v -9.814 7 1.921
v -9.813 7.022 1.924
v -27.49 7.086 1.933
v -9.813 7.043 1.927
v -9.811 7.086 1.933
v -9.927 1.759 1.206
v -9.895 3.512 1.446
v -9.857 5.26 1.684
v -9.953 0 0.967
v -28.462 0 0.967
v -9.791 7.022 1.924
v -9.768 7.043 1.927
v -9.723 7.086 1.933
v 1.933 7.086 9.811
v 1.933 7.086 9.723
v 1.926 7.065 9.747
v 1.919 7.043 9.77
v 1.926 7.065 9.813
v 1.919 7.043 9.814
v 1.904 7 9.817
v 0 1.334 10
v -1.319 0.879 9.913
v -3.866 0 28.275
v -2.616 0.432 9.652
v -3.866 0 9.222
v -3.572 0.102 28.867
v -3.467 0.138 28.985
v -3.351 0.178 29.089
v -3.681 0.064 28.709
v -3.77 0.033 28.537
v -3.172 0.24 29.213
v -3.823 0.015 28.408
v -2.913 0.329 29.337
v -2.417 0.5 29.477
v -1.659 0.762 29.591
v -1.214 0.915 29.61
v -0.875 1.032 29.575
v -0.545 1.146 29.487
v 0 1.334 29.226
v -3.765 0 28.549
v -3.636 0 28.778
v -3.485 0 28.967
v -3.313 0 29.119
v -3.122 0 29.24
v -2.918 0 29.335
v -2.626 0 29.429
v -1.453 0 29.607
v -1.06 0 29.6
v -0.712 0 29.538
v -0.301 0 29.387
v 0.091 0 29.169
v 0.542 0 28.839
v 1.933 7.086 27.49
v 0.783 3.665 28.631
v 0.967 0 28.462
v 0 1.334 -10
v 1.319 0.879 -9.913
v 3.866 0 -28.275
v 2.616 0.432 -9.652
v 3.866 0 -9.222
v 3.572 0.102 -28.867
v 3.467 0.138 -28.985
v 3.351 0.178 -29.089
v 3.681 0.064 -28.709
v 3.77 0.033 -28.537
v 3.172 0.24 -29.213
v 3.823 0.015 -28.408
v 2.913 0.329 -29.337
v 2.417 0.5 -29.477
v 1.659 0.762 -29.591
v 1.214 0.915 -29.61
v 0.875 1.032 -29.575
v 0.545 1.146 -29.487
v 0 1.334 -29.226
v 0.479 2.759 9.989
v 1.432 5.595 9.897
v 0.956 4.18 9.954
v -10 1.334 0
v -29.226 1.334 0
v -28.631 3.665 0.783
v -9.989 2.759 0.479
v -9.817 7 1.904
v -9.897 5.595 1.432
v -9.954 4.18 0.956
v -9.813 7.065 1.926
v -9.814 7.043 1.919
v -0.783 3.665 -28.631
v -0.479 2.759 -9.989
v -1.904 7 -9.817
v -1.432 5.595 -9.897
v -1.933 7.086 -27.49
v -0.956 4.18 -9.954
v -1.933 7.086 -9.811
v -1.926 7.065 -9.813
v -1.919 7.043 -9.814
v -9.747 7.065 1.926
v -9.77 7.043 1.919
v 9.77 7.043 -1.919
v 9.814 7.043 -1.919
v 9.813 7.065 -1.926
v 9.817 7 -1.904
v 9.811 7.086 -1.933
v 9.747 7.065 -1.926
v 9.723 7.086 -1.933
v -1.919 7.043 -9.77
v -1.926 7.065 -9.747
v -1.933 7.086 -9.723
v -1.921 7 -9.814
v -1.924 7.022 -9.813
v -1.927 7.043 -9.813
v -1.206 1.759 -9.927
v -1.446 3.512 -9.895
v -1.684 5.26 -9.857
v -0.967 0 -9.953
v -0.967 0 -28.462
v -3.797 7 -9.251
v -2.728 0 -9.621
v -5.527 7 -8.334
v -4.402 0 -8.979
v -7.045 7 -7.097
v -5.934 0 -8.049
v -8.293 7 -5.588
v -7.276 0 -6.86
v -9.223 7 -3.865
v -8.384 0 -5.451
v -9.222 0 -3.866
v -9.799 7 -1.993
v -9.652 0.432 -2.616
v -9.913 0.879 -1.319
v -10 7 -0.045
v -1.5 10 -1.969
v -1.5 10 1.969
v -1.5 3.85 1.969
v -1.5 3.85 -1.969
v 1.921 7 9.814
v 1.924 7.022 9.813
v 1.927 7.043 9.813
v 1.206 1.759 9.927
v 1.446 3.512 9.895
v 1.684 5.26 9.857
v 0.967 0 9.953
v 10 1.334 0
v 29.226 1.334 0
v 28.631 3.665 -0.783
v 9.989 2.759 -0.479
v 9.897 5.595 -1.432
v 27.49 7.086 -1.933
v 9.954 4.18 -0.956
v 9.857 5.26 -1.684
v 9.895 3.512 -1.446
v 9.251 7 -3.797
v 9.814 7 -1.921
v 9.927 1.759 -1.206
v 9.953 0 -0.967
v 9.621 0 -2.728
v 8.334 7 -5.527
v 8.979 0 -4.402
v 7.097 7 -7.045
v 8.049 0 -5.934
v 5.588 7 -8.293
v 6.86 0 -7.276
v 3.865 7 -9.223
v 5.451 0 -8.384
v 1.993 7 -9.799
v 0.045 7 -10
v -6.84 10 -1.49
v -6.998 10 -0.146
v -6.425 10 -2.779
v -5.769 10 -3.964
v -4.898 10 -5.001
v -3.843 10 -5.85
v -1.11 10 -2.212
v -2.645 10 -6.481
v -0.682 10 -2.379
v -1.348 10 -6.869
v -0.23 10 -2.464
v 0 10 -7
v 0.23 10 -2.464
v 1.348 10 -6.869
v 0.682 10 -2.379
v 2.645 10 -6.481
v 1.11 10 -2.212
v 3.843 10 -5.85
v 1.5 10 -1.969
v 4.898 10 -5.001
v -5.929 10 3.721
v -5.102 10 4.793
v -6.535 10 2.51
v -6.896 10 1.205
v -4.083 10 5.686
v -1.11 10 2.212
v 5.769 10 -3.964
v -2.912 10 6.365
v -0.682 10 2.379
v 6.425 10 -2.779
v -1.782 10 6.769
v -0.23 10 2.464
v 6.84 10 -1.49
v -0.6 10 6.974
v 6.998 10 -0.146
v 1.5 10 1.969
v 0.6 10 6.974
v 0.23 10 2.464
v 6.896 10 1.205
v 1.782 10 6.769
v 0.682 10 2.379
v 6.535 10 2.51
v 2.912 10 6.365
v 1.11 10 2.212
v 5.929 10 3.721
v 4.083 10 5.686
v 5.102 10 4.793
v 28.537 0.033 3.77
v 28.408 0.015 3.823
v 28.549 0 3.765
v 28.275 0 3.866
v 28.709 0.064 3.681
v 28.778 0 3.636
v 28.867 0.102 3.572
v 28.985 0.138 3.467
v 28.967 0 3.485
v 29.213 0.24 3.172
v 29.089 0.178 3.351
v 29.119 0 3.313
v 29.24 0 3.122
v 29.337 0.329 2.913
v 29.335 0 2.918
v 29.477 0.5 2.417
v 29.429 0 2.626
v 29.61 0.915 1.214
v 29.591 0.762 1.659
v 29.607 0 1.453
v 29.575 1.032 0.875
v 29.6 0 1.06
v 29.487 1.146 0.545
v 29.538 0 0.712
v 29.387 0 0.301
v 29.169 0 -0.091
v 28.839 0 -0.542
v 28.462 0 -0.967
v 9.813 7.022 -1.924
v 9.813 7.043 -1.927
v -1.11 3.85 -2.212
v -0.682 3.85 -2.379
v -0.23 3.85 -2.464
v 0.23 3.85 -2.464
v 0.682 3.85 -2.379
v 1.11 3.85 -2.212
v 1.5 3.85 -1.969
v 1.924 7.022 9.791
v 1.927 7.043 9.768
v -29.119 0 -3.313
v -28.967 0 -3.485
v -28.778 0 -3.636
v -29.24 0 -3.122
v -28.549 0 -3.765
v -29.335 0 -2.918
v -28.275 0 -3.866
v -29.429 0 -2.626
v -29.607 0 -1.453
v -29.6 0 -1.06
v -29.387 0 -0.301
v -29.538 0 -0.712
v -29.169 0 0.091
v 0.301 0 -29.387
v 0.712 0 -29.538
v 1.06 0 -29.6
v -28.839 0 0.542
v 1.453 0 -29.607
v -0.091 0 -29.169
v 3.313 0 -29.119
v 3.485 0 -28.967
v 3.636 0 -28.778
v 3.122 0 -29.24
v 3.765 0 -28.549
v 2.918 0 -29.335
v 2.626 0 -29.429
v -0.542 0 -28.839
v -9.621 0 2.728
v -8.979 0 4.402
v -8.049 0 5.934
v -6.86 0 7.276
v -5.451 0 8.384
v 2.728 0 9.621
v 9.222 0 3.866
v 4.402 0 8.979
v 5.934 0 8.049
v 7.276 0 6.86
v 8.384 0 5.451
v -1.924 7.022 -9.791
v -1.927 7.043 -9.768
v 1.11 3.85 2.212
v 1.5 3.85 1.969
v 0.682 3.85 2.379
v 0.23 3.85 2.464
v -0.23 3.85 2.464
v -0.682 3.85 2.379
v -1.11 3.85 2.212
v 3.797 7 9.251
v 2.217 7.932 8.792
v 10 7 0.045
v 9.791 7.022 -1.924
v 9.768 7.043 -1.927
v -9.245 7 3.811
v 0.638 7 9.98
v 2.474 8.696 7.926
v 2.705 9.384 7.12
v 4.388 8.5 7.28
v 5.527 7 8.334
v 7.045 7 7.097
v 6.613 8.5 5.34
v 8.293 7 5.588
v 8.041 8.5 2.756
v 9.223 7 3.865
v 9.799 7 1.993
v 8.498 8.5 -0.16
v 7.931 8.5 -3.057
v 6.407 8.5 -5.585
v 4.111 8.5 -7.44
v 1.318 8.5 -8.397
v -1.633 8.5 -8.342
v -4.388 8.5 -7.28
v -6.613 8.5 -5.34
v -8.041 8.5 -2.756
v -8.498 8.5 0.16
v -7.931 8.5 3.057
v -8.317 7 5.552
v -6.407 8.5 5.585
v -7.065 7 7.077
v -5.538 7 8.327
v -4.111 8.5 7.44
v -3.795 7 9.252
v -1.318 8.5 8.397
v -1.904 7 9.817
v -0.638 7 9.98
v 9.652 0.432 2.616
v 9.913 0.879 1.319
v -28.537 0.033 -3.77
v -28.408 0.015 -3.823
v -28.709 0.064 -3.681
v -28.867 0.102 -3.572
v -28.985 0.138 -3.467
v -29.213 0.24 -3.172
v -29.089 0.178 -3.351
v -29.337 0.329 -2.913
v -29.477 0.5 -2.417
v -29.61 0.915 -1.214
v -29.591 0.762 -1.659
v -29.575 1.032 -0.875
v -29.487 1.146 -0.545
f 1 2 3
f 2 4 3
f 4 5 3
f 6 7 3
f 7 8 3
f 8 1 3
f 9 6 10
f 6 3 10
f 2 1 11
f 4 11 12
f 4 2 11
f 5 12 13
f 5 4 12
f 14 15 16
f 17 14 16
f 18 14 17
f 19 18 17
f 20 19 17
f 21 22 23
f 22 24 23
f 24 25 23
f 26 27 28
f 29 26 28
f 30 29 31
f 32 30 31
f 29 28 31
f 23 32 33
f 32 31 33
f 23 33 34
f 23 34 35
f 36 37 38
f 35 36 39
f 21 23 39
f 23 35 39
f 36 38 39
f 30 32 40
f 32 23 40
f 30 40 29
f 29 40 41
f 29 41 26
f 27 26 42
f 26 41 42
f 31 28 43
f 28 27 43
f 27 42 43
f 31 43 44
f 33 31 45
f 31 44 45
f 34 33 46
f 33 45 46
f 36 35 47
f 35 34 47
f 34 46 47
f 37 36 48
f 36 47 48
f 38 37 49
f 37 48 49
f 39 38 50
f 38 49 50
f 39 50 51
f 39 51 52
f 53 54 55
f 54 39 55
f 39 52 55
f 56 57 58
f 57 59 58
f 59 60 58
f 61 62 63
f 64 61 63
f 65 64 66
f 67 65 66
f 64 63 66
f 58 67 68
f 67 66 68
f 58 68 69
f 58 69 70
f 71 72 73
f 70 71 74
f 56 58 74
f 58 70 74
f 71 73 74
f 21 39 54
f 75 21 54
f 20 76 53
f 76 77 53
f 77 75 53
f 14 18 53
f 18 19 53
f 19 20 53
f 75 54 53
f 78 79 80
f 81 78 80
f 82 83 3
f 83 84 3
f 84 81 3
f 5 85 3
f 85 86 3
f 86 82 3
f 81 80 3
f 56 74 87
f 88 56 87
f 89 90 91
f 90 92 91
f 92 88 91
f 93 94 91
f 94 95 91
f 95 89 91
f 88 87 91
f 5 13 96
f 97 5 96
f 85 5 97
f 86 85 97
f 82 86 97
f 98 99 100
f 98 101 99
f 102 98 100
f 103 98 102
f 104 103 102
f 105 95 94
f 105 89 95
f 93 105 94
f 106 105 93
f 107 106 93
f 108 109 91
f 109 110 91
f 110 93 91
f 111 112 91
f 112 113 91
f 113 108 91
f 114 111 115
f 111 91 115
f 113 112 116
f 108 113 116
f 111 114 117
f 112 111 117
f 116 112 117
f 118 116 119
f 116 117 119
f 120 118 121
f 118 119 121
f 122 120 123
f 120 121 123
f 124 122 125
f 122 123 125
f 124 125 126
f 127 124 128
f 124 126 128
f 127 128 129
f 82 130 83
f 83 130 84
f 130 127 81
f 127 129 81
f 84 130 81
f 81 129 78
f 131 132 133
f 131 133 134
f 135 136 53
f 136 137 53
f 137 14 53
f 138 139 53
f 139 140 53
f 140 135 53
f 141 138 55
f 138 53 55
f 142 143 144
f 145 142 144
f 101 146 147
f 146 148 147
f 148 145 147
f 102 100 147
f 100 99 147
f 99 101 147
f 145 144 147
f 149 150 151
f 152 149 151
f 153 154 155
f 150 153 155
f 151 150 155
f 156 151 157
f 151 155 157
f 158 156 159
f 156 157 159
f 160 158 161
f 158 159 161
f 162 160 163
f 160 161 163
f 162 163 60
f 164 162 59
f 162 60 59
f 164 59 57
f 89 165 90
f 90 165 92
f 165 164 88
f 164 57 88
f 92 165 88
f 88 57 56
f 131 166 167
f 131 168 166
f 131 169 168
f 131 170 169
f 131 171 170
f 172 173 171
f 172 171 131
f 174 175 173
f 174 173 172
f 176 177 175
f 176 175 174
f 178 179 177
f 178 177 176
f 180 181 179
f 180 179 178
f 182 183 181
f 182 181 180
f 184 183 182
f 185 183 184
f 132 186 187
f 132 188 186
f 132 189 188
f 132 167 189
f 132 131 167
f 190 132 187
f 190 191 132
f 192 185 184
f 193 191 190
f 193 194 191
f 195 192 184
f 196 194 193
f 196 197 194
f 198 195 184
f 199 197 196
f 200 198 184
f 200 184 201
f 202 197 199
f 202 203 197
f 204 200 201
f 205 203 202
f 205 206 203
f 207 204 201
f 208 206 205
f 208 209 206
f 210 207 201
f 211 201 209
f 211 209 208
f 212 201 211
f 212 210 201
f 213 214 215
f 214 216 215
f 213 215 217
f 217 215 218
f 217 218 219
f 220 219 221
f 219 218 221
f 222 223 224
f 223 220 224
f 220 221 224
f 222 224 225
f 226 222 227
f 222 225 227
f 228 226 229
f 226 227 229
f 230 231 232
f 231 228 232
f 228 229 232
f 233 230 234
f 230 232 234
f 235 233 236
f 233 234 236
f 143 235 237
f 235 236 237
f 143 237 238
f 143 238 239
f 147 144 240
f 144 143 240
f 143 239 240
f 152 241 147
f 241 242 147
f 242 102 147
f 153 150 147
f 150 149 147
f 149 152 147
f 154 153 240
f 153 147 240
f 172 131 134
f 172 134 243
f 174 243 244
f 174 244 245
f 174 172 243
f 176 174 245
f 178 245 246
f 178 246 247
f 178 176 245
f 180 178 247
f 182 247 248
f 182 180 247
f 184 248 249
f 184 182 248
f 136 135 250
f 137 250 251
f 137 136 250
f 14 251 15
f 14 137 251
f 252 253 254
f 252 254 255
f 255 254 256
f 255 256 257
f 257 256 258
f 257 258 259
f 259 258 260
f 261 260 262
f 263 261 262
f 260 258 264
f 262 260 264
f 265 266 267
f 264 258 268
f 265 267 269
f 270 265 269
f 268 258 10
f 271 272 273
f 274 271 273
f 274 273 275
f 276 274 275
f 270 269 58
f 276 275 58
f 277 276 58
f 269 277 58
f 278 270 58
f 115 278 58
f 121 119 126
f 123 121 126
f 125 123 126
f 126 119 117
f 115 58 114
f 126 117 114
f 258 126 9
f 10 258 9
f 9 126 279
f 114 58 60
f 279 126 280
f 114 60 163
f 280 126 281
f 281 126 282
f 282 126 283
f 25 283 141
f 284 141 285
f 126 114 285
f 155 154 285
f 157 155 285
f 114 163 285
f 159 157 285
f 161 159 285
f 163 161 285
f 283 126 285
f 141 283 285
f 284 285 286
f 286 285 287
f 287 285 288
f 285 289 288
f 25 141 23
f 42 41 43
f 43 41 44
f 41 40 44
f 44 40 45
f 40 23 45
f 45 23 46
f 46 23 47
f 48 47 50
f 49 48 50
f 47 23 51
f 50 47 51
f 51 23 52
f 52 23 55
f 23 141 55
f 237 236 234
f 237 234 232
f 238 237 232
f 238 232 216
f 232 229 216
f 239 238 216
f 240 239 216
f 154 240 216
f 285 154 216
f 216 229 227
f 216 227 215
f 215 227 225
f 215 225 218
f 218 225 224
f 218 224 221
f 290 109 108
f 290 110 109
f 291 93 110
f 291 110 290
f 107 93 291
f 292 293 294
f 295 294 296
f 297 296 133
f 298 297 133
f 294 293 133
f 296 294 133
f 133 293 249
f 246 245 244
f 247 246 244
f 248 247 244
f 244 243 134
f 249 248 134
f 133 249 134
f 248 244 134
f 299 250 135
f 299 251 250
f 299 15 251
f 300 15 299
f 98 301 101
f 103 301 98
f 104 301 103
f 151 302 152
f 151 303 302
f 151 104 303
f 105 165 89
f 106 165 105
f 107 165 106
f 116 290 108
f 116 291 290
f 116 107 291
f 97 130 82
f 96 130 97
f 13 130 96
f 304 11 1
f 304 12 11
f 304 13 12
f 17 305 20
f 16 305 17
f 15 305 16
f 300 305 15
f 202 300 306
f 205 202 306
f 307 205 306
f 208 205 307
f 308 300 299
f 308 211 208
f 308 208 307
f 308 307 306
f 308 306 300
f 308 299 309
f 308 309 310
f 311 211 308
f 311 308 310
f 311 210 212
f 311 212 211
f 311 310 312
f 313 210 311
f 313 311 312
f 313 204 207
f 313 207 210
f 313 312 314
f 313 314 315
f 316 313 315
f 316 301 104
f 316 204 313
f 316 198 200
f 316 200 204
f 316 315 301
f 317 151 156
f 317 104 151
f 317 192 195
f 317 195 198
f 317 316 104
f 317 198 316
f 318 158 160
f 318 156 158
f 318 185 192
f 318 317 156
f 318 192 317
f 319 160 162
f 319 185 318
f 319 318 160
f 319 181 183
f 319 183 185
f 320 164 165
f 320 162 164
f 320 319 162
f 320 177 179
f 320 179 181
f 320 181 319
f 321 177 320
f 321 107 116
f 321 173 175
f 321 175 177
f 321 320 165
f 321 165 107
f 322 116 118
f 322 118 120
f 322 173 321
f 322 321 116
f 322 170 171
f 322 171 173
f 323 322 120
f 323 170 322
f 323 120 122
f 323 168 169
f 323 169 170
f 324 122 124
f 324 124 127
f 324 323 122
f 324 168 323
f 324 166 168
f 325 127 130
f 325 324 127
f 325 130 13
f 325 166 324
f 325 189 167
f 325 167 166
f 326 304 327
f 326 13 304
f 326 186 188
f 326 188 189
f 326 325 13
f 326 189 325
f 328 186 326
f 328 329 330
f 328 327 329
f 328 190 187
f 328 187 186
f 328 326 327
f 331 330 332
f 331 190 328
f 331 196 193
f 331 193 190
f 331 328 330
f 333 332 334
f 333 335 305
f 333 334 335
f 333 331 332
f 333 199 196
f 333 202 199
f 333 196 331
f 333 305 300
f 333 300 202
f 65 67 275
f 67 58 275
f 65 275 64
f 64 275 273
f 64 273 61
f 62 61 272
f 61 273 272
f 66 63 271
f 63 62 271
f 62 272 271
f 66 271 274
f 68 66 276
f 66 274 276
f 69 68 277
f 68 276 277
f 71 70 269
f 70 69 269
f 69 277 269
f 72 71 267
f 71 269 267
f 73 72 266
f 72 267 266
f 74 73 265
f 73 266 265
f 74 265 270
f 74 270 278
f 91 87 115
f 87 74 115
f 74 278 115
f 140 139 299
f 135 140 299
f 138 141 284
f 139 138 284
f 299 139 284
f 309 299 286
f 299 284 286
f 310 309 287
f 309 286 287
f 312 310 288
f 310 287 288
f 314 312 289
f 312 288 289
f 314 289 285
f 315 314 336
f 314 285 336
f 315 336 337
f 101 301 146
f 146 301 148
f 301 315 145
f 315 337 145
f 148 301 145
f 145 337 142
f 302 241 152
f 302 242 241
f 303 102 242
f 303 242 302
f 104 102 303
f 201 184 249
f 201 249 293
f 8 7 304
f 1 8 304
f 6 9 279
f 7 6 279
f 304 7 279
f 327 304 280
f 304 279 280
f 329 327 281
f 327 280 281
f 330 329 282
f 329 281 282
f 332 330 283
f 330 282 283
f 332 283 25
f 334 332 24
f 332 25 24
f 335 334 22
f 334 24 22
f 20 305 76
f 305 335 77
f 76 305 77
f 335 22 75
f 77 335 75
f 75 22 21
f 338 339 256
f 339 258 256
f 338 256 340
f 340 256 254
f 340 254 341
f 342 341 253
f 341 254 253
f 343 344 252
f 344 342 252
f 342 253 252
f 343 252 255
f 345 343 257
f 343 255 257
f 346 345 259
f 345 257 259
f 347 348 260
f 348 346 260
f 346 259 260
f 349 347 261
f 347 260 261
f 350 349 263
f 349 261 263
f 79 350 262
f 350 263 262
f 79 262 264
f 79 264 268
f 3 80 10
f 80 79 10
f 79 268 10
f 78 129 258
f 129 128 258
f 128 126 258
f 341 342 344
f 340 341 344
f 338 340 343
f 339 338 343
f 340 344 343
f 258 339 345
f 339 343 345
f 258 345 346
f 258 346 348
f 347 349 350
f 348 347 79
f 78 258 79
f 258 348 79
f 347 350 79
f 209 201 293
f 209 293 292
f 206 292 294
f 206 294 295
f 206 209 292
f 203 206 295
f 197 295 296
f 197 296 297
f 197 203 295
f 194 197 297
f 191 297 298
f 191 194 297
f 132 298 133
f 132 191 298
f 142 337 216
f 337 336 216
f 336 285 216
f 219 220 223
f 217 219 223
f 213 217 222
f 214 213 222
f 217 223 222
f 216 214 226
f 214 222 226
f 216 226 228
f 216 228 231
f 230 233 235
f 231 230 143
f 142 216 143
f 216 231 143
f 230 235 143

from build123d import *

# Parameters (mm, degrees)
SKETCH1_R           = 10
BOSS_EXTRUDE2_DEPTH = 10
CIRPATTERN1_COUNT   = 4
CUT_EXTRUDE3_DEPTH  = 6.15
CUT_EXTRUDE4_DEPTH  = 8.45
CIRPATTERN2_COUNT   = 4
CHAMFER1_SIZE       = 3


with BuildPart() as part:
    # Sketch1 → Boss-Extrude2 (new body)
    with BuildSketch(Plane(origin=(0, 0, 0), x_dir=(1, 0, 0), z_dir=(0, 1, 0))):
        with Locations(Location((0, 0, 0), (0, 0, 270))):
            Circle(SKETCH1_R)
    extrude(amount=BOSS_EXTRUDE2_DEPTH)

    # Sketch2 → Loft1 section 0
    with BuildSketch(Plane.XY.offset(8)):
        with BuildLine():
            Line((0, 1.334072036), (1.933158154, 7.086396301))
            Line((1.933158154, 7.086396301), (0.966579077, 0))
            Line((0.966579077, 0), (-3.866316309, 0))
            Line((-3.866316309, 0), (0, 1.334072036))
        make_face()
    # Sketch3 → Loft1 section 1
    with BuildSketch(Plane.XY.offset(30)):
        with BuildLine():
            Line((0, 1.334072036), (1.933158154, 7.086396301))
            Line((1.933158154, 7.086396301), (0.966579077, 0))
            Line((0.966579077, 0), (-3.866316309, 0))
            Line((-3.866316309, 0), (0, 1.334072036))
        make_face()
    loft1 = loft()

    # CirPattern1: Loft1 ×4 about axis
    cirpattern1_axis = Axis((0, 0, 0), (0, 1, 0))
    for i in range(1, CIRPATTERN1_COUNT):
        add(loft1.rotate(cirpattern1_axis, i * 360 / CIRPATTERN1_COUNT))

    # Sketch8 → Cut-Extrude3 (cut)
    with BuildSketch(Plane(origin=(0, 10, 0), x_dir=(1, 0, 0), z_dir=(0, 1, 0))):
        with BuildLine():
            Line((1.5, 1.968660712), (1.5, -1.968660712))
            ThreePointArc((1.5, -1.968660712), (0, -2.475), (-1.5, -1.968660712))
            Line((-1.5, -1.968660712), (-1.5, 1.968660712))
            ThreePointArc((-1.5, 1.968660712), (0, 2.475), (1.5, 1.968660712))
        make_face()
    extrude(amount=-CUT_EXTRUDE3_DEPTH, mode=Mode.SUBTRACT)

    # Sketch9 → Cut-Extrude4 (cut)
    with BuildSketch(Plane.XZ):
        with BuildLine():
            Line((28.274704093, 3.866316309), (30.023429762, 3.866316309))
            Line((30.023429762, 3.866316309), (30.023429762, -1.933158154))
            Line((30.023429762, -1.933158154), (27.489632408, -1.933158154))
            add(Edge.make_bspline(
                [(28.274704093, 3.866316309), (29.251563836, 3.579912726), (29.503721472, 2.469841159), (29.781293332, 0.089495711), (28.257519324, -1.153109295), (27.489632408, -1.933158154)],
                knots=[0, 0, 0, 0, 0.329035363, 0.48426931, 1, 1, 1, 1], degree=3))
        make_face()
    cut_extrude4 = extrude(amount=-CUT_EXTRUDE4_DEPTH, mode=Mode.SUBTRACT)

    # CirPattern2: Cut-Extrude4 ×4 about axis
    cirpattern2_axis = Axis((0, 10, 0), (0, 1, 0))
    for i in range(1, CIRPATTERN2_COUNT):
        add(cut_extrude4.rotate(cirpattern2_axis, i * 360 / CIRPATTERN2_COUNT), mode=Mode.SUBTRACT)

    # Chamfer1
    # the kernel refuses this chamfer: 3 mm, written as the material it takes off along each edge
    with BuildSketch(Plane(origin=(0, 10, 0), x_dir=(0, 0, 1), z_dir=(-1, 0, 0))) as chamfer1_piece_1_section:
        Polygon((10, -CHAMFER1_SIZE), (10 - CHAMFER1_SIZE, 0), (10, 0), align=None)
    chamfer1_piece_1 = revolve(axis=Axis((0, 10, 0), (0, 1, 0)), mode=Mode.PRIVATE)
    chamfer1_piece_1 = split(chamfer1_piece_1, bisect_by=Plane(origin=(2.324578556, 8.251110666, 8.890331171), z_dir=(-0.947903464475993, 0.3185577216681616, 0)), keep=Keep.TOP, mode=Mode.PRIVATE)
    chamfer1_piece_1 = split(chamfer1_piece_1, bisect_by=Plane(origin=(-2.324578556, 8.251110666, 8.890331171), z_dir=(0.947903464475993, 0.3185577216681616, 0)), keep=Keep.TOP, mode=Mode.PRIVATE)
    add(chamfer1_piece_1, mode=Mode.SUBTRACT)
    with BuildSketch(Plane(origin=(0, 10, 0), x_dir=(0, 0, 1), z_dir=(-1, 0, 0))) as chamfer1_piece_2_section:
        Polygon((10, -CHAMFER1_SIZE), (10 - CHAMFER1_SIZE, 0), (10, 0), align=None)
    chamfer1_piece_2 = revolve(axis=Axis((0, 10, 0), (0, 1, 0)), mode=Mode.PRIVATE)
    chamfer1_piece_2 = split(chamfer1_piece_2, bisect_by=Plane(origin=(-1.927187537, 7.042623199, 9.791355143), z_dir=(0.9908254446191594, 0.13514783866287053, 0)), keep=Keep.TOP, mode=Mode.PRIVATE)
    chamfer1_piece_2 = split(chamfer1_piece_2, bisect_by=Plane(origin=(-1.922954088, 3.507226982, -0.730322564), z_dir=(0, 0.3185577216681616, 0.947903464475993)), keep=Keep.TOP, mode=Mode.PRIVATE)
    chamfer1_piece_2 = split(chamfer1_piece_2, bisect_by=Plane(origin=(-1.919079209, 7.044502852, 9.791355143), z_dir=(-0.947903464475993, -0.3185577216681616, 0)), keep=Keep.TOP, mode=Mode.PRIVATE)
    add(chamfer1_piece_2, mode=Mode.SUBTRACT)
    with BuildSketch(Plane(origin=(0, 10, 0), x_dir=(0, 0, 1), z_dir=(-1, 0, 0))) as chamfer1_piece_3_section:
        Polygon((10, -CHAMFER1_SIZE), (10 - CHAMFER1_SIZE, 0), (10, 0), align=None)
    chamfer1_piece_3 = revolve(axis=Axis((0, 10, 0), (0, 1, 0)), mode=Mode.PRIVATE)
    chamfer1_piece_3 = split(chamfer1_piece_3, bisect_by=Plane(origin=(2.255597721, 9.450335897, 6.172482093), z_dir=(0.9908254446191594, -0.13514783866287053, 0)), keep=Keep.TOP, mode=Mode.PRIVATE)
    chamfer1_piece_3 = split(chamfer1_piece_3, bisect_by=Plane(origin=(6.172482093, 6.28280667, -1.663099344), z_dir=(0, 0.3185577216681616, 0.947903464475993)), keep=Keep.TOP, mode=Mode.PRIVATE)
    add(chamfer1_piece_3, mode=Mode.SUBTRACT)
    with BuildSketch(Plane(origin=(0, 10, 0), x_dir=(0, 0, 1), z_dir=(-1, 0, 0))) as chamfer1_piece_4_section:
        Polygon((10, -CHAMFER1_SIZE), (10 - CHAMFER1_SIZE, 0), (10, 0), align=None)
    chamfer1_piece_4 = revolve(axis=Axis((0, 10, 0), (0, 1, 0)), mode=Mode.PRIVATE)
    chamfer1_piece_4 = split(chamfer1_piece_4, bisect_by=Plane(origin=(-6.172482093, 9.450335897, 2.255597721), z_dir=(0, -0.13514783866287053, 0.9908254446191594)), keep=Keep.TOP, mode=Mode.PRIVATE)
    chamfer1_piece_4 = split(chamfer1_piece_4, bisect_by=Plane(origin=(-2.915854237, 10.010516351, 6.172482093), z_dir=(-0.947903464475993, -0.3185577216681616, 0)), keep=Keep.TOP, mode=Mode.PRIVATE)
    add(chamfer1_piece_4, mode=Mode.SUBTRACT)
    with BuildSketch(Plane(origin=(0, 10, 0), x_dir=(0, 0, 1), z_dir=(-1, 0, 0))) as chamfer1_piece_5_section:
        Polygon((10, -CHAMFER1_SIZE), (10 - CHAMFER1_SIZE, 0), (10, 0), align=None)
    chamfer1_piece_5 = revolve(axis=Axis((0, 10, 0), (0, 1, 0)), mode=Mode.PRIVATE)
    chamfer1_piece_5 = split(chamfer1_piece_5, bisect_by=Plane(origin=(-2.32080528, 9.928399838, 0), z_dir=(-0.9908254446191594, -0.13514783866287053, 0)), keep=Keep.TOP, mode=Mode.PRIVATE)
    chamfer1_piece_5 = split(chamfer1_piece_5, bisect_by=Plane(origin=(-8.890331171, 8.251110666, 2.324578556), z_dir=(0, 0.3185577216681616, -0.947903464475993)), keep=Keep.TOP, mode=Mode.PRIVATE)
    add(chamfer1_piece_5, mode=Mode.SUBTRACT)
    with BuildSketch(Plane(origin=(0, 10, 0), x_dir=(0, 0, 1), z_dir=(-1, 0, 0))) as chamfer1_piece_6_section:
        Polygon((10, -CHAMFER1_SIZE), (10 - CHAMFER1_SIZE, 0), (10, 0), align=None)
    chamfer1_piece_6 = revolve(axis=Axis((0, 10, 0), (0, 1, 0)), mode=Mode.PRIVATE)
    chamfer1_piece_6 = split(chamfer1_piece_6, bisect_by=Plane(origin=(6.172482093, 9.450335897, -2.255597721), z_dir=(0, -0.13514783866287053, -0.9908254446191594)), keep=Keep.TOP, mode=Mode.PRIVATE)
    chamfer1_piece_6 = split(chamfer1_piece_6, bisect_by=Plane(origin=(-1.663099344, 6.28280667, -6.172482093), z_dir=(0.947903464475993, 0.3185577216681616, 0)), keep=Keep.TOP, mode=Mode.PRIVATE)
    add(chamfer1_piece_6, mode=Mode.SUBTRACT)


solid = part.part
